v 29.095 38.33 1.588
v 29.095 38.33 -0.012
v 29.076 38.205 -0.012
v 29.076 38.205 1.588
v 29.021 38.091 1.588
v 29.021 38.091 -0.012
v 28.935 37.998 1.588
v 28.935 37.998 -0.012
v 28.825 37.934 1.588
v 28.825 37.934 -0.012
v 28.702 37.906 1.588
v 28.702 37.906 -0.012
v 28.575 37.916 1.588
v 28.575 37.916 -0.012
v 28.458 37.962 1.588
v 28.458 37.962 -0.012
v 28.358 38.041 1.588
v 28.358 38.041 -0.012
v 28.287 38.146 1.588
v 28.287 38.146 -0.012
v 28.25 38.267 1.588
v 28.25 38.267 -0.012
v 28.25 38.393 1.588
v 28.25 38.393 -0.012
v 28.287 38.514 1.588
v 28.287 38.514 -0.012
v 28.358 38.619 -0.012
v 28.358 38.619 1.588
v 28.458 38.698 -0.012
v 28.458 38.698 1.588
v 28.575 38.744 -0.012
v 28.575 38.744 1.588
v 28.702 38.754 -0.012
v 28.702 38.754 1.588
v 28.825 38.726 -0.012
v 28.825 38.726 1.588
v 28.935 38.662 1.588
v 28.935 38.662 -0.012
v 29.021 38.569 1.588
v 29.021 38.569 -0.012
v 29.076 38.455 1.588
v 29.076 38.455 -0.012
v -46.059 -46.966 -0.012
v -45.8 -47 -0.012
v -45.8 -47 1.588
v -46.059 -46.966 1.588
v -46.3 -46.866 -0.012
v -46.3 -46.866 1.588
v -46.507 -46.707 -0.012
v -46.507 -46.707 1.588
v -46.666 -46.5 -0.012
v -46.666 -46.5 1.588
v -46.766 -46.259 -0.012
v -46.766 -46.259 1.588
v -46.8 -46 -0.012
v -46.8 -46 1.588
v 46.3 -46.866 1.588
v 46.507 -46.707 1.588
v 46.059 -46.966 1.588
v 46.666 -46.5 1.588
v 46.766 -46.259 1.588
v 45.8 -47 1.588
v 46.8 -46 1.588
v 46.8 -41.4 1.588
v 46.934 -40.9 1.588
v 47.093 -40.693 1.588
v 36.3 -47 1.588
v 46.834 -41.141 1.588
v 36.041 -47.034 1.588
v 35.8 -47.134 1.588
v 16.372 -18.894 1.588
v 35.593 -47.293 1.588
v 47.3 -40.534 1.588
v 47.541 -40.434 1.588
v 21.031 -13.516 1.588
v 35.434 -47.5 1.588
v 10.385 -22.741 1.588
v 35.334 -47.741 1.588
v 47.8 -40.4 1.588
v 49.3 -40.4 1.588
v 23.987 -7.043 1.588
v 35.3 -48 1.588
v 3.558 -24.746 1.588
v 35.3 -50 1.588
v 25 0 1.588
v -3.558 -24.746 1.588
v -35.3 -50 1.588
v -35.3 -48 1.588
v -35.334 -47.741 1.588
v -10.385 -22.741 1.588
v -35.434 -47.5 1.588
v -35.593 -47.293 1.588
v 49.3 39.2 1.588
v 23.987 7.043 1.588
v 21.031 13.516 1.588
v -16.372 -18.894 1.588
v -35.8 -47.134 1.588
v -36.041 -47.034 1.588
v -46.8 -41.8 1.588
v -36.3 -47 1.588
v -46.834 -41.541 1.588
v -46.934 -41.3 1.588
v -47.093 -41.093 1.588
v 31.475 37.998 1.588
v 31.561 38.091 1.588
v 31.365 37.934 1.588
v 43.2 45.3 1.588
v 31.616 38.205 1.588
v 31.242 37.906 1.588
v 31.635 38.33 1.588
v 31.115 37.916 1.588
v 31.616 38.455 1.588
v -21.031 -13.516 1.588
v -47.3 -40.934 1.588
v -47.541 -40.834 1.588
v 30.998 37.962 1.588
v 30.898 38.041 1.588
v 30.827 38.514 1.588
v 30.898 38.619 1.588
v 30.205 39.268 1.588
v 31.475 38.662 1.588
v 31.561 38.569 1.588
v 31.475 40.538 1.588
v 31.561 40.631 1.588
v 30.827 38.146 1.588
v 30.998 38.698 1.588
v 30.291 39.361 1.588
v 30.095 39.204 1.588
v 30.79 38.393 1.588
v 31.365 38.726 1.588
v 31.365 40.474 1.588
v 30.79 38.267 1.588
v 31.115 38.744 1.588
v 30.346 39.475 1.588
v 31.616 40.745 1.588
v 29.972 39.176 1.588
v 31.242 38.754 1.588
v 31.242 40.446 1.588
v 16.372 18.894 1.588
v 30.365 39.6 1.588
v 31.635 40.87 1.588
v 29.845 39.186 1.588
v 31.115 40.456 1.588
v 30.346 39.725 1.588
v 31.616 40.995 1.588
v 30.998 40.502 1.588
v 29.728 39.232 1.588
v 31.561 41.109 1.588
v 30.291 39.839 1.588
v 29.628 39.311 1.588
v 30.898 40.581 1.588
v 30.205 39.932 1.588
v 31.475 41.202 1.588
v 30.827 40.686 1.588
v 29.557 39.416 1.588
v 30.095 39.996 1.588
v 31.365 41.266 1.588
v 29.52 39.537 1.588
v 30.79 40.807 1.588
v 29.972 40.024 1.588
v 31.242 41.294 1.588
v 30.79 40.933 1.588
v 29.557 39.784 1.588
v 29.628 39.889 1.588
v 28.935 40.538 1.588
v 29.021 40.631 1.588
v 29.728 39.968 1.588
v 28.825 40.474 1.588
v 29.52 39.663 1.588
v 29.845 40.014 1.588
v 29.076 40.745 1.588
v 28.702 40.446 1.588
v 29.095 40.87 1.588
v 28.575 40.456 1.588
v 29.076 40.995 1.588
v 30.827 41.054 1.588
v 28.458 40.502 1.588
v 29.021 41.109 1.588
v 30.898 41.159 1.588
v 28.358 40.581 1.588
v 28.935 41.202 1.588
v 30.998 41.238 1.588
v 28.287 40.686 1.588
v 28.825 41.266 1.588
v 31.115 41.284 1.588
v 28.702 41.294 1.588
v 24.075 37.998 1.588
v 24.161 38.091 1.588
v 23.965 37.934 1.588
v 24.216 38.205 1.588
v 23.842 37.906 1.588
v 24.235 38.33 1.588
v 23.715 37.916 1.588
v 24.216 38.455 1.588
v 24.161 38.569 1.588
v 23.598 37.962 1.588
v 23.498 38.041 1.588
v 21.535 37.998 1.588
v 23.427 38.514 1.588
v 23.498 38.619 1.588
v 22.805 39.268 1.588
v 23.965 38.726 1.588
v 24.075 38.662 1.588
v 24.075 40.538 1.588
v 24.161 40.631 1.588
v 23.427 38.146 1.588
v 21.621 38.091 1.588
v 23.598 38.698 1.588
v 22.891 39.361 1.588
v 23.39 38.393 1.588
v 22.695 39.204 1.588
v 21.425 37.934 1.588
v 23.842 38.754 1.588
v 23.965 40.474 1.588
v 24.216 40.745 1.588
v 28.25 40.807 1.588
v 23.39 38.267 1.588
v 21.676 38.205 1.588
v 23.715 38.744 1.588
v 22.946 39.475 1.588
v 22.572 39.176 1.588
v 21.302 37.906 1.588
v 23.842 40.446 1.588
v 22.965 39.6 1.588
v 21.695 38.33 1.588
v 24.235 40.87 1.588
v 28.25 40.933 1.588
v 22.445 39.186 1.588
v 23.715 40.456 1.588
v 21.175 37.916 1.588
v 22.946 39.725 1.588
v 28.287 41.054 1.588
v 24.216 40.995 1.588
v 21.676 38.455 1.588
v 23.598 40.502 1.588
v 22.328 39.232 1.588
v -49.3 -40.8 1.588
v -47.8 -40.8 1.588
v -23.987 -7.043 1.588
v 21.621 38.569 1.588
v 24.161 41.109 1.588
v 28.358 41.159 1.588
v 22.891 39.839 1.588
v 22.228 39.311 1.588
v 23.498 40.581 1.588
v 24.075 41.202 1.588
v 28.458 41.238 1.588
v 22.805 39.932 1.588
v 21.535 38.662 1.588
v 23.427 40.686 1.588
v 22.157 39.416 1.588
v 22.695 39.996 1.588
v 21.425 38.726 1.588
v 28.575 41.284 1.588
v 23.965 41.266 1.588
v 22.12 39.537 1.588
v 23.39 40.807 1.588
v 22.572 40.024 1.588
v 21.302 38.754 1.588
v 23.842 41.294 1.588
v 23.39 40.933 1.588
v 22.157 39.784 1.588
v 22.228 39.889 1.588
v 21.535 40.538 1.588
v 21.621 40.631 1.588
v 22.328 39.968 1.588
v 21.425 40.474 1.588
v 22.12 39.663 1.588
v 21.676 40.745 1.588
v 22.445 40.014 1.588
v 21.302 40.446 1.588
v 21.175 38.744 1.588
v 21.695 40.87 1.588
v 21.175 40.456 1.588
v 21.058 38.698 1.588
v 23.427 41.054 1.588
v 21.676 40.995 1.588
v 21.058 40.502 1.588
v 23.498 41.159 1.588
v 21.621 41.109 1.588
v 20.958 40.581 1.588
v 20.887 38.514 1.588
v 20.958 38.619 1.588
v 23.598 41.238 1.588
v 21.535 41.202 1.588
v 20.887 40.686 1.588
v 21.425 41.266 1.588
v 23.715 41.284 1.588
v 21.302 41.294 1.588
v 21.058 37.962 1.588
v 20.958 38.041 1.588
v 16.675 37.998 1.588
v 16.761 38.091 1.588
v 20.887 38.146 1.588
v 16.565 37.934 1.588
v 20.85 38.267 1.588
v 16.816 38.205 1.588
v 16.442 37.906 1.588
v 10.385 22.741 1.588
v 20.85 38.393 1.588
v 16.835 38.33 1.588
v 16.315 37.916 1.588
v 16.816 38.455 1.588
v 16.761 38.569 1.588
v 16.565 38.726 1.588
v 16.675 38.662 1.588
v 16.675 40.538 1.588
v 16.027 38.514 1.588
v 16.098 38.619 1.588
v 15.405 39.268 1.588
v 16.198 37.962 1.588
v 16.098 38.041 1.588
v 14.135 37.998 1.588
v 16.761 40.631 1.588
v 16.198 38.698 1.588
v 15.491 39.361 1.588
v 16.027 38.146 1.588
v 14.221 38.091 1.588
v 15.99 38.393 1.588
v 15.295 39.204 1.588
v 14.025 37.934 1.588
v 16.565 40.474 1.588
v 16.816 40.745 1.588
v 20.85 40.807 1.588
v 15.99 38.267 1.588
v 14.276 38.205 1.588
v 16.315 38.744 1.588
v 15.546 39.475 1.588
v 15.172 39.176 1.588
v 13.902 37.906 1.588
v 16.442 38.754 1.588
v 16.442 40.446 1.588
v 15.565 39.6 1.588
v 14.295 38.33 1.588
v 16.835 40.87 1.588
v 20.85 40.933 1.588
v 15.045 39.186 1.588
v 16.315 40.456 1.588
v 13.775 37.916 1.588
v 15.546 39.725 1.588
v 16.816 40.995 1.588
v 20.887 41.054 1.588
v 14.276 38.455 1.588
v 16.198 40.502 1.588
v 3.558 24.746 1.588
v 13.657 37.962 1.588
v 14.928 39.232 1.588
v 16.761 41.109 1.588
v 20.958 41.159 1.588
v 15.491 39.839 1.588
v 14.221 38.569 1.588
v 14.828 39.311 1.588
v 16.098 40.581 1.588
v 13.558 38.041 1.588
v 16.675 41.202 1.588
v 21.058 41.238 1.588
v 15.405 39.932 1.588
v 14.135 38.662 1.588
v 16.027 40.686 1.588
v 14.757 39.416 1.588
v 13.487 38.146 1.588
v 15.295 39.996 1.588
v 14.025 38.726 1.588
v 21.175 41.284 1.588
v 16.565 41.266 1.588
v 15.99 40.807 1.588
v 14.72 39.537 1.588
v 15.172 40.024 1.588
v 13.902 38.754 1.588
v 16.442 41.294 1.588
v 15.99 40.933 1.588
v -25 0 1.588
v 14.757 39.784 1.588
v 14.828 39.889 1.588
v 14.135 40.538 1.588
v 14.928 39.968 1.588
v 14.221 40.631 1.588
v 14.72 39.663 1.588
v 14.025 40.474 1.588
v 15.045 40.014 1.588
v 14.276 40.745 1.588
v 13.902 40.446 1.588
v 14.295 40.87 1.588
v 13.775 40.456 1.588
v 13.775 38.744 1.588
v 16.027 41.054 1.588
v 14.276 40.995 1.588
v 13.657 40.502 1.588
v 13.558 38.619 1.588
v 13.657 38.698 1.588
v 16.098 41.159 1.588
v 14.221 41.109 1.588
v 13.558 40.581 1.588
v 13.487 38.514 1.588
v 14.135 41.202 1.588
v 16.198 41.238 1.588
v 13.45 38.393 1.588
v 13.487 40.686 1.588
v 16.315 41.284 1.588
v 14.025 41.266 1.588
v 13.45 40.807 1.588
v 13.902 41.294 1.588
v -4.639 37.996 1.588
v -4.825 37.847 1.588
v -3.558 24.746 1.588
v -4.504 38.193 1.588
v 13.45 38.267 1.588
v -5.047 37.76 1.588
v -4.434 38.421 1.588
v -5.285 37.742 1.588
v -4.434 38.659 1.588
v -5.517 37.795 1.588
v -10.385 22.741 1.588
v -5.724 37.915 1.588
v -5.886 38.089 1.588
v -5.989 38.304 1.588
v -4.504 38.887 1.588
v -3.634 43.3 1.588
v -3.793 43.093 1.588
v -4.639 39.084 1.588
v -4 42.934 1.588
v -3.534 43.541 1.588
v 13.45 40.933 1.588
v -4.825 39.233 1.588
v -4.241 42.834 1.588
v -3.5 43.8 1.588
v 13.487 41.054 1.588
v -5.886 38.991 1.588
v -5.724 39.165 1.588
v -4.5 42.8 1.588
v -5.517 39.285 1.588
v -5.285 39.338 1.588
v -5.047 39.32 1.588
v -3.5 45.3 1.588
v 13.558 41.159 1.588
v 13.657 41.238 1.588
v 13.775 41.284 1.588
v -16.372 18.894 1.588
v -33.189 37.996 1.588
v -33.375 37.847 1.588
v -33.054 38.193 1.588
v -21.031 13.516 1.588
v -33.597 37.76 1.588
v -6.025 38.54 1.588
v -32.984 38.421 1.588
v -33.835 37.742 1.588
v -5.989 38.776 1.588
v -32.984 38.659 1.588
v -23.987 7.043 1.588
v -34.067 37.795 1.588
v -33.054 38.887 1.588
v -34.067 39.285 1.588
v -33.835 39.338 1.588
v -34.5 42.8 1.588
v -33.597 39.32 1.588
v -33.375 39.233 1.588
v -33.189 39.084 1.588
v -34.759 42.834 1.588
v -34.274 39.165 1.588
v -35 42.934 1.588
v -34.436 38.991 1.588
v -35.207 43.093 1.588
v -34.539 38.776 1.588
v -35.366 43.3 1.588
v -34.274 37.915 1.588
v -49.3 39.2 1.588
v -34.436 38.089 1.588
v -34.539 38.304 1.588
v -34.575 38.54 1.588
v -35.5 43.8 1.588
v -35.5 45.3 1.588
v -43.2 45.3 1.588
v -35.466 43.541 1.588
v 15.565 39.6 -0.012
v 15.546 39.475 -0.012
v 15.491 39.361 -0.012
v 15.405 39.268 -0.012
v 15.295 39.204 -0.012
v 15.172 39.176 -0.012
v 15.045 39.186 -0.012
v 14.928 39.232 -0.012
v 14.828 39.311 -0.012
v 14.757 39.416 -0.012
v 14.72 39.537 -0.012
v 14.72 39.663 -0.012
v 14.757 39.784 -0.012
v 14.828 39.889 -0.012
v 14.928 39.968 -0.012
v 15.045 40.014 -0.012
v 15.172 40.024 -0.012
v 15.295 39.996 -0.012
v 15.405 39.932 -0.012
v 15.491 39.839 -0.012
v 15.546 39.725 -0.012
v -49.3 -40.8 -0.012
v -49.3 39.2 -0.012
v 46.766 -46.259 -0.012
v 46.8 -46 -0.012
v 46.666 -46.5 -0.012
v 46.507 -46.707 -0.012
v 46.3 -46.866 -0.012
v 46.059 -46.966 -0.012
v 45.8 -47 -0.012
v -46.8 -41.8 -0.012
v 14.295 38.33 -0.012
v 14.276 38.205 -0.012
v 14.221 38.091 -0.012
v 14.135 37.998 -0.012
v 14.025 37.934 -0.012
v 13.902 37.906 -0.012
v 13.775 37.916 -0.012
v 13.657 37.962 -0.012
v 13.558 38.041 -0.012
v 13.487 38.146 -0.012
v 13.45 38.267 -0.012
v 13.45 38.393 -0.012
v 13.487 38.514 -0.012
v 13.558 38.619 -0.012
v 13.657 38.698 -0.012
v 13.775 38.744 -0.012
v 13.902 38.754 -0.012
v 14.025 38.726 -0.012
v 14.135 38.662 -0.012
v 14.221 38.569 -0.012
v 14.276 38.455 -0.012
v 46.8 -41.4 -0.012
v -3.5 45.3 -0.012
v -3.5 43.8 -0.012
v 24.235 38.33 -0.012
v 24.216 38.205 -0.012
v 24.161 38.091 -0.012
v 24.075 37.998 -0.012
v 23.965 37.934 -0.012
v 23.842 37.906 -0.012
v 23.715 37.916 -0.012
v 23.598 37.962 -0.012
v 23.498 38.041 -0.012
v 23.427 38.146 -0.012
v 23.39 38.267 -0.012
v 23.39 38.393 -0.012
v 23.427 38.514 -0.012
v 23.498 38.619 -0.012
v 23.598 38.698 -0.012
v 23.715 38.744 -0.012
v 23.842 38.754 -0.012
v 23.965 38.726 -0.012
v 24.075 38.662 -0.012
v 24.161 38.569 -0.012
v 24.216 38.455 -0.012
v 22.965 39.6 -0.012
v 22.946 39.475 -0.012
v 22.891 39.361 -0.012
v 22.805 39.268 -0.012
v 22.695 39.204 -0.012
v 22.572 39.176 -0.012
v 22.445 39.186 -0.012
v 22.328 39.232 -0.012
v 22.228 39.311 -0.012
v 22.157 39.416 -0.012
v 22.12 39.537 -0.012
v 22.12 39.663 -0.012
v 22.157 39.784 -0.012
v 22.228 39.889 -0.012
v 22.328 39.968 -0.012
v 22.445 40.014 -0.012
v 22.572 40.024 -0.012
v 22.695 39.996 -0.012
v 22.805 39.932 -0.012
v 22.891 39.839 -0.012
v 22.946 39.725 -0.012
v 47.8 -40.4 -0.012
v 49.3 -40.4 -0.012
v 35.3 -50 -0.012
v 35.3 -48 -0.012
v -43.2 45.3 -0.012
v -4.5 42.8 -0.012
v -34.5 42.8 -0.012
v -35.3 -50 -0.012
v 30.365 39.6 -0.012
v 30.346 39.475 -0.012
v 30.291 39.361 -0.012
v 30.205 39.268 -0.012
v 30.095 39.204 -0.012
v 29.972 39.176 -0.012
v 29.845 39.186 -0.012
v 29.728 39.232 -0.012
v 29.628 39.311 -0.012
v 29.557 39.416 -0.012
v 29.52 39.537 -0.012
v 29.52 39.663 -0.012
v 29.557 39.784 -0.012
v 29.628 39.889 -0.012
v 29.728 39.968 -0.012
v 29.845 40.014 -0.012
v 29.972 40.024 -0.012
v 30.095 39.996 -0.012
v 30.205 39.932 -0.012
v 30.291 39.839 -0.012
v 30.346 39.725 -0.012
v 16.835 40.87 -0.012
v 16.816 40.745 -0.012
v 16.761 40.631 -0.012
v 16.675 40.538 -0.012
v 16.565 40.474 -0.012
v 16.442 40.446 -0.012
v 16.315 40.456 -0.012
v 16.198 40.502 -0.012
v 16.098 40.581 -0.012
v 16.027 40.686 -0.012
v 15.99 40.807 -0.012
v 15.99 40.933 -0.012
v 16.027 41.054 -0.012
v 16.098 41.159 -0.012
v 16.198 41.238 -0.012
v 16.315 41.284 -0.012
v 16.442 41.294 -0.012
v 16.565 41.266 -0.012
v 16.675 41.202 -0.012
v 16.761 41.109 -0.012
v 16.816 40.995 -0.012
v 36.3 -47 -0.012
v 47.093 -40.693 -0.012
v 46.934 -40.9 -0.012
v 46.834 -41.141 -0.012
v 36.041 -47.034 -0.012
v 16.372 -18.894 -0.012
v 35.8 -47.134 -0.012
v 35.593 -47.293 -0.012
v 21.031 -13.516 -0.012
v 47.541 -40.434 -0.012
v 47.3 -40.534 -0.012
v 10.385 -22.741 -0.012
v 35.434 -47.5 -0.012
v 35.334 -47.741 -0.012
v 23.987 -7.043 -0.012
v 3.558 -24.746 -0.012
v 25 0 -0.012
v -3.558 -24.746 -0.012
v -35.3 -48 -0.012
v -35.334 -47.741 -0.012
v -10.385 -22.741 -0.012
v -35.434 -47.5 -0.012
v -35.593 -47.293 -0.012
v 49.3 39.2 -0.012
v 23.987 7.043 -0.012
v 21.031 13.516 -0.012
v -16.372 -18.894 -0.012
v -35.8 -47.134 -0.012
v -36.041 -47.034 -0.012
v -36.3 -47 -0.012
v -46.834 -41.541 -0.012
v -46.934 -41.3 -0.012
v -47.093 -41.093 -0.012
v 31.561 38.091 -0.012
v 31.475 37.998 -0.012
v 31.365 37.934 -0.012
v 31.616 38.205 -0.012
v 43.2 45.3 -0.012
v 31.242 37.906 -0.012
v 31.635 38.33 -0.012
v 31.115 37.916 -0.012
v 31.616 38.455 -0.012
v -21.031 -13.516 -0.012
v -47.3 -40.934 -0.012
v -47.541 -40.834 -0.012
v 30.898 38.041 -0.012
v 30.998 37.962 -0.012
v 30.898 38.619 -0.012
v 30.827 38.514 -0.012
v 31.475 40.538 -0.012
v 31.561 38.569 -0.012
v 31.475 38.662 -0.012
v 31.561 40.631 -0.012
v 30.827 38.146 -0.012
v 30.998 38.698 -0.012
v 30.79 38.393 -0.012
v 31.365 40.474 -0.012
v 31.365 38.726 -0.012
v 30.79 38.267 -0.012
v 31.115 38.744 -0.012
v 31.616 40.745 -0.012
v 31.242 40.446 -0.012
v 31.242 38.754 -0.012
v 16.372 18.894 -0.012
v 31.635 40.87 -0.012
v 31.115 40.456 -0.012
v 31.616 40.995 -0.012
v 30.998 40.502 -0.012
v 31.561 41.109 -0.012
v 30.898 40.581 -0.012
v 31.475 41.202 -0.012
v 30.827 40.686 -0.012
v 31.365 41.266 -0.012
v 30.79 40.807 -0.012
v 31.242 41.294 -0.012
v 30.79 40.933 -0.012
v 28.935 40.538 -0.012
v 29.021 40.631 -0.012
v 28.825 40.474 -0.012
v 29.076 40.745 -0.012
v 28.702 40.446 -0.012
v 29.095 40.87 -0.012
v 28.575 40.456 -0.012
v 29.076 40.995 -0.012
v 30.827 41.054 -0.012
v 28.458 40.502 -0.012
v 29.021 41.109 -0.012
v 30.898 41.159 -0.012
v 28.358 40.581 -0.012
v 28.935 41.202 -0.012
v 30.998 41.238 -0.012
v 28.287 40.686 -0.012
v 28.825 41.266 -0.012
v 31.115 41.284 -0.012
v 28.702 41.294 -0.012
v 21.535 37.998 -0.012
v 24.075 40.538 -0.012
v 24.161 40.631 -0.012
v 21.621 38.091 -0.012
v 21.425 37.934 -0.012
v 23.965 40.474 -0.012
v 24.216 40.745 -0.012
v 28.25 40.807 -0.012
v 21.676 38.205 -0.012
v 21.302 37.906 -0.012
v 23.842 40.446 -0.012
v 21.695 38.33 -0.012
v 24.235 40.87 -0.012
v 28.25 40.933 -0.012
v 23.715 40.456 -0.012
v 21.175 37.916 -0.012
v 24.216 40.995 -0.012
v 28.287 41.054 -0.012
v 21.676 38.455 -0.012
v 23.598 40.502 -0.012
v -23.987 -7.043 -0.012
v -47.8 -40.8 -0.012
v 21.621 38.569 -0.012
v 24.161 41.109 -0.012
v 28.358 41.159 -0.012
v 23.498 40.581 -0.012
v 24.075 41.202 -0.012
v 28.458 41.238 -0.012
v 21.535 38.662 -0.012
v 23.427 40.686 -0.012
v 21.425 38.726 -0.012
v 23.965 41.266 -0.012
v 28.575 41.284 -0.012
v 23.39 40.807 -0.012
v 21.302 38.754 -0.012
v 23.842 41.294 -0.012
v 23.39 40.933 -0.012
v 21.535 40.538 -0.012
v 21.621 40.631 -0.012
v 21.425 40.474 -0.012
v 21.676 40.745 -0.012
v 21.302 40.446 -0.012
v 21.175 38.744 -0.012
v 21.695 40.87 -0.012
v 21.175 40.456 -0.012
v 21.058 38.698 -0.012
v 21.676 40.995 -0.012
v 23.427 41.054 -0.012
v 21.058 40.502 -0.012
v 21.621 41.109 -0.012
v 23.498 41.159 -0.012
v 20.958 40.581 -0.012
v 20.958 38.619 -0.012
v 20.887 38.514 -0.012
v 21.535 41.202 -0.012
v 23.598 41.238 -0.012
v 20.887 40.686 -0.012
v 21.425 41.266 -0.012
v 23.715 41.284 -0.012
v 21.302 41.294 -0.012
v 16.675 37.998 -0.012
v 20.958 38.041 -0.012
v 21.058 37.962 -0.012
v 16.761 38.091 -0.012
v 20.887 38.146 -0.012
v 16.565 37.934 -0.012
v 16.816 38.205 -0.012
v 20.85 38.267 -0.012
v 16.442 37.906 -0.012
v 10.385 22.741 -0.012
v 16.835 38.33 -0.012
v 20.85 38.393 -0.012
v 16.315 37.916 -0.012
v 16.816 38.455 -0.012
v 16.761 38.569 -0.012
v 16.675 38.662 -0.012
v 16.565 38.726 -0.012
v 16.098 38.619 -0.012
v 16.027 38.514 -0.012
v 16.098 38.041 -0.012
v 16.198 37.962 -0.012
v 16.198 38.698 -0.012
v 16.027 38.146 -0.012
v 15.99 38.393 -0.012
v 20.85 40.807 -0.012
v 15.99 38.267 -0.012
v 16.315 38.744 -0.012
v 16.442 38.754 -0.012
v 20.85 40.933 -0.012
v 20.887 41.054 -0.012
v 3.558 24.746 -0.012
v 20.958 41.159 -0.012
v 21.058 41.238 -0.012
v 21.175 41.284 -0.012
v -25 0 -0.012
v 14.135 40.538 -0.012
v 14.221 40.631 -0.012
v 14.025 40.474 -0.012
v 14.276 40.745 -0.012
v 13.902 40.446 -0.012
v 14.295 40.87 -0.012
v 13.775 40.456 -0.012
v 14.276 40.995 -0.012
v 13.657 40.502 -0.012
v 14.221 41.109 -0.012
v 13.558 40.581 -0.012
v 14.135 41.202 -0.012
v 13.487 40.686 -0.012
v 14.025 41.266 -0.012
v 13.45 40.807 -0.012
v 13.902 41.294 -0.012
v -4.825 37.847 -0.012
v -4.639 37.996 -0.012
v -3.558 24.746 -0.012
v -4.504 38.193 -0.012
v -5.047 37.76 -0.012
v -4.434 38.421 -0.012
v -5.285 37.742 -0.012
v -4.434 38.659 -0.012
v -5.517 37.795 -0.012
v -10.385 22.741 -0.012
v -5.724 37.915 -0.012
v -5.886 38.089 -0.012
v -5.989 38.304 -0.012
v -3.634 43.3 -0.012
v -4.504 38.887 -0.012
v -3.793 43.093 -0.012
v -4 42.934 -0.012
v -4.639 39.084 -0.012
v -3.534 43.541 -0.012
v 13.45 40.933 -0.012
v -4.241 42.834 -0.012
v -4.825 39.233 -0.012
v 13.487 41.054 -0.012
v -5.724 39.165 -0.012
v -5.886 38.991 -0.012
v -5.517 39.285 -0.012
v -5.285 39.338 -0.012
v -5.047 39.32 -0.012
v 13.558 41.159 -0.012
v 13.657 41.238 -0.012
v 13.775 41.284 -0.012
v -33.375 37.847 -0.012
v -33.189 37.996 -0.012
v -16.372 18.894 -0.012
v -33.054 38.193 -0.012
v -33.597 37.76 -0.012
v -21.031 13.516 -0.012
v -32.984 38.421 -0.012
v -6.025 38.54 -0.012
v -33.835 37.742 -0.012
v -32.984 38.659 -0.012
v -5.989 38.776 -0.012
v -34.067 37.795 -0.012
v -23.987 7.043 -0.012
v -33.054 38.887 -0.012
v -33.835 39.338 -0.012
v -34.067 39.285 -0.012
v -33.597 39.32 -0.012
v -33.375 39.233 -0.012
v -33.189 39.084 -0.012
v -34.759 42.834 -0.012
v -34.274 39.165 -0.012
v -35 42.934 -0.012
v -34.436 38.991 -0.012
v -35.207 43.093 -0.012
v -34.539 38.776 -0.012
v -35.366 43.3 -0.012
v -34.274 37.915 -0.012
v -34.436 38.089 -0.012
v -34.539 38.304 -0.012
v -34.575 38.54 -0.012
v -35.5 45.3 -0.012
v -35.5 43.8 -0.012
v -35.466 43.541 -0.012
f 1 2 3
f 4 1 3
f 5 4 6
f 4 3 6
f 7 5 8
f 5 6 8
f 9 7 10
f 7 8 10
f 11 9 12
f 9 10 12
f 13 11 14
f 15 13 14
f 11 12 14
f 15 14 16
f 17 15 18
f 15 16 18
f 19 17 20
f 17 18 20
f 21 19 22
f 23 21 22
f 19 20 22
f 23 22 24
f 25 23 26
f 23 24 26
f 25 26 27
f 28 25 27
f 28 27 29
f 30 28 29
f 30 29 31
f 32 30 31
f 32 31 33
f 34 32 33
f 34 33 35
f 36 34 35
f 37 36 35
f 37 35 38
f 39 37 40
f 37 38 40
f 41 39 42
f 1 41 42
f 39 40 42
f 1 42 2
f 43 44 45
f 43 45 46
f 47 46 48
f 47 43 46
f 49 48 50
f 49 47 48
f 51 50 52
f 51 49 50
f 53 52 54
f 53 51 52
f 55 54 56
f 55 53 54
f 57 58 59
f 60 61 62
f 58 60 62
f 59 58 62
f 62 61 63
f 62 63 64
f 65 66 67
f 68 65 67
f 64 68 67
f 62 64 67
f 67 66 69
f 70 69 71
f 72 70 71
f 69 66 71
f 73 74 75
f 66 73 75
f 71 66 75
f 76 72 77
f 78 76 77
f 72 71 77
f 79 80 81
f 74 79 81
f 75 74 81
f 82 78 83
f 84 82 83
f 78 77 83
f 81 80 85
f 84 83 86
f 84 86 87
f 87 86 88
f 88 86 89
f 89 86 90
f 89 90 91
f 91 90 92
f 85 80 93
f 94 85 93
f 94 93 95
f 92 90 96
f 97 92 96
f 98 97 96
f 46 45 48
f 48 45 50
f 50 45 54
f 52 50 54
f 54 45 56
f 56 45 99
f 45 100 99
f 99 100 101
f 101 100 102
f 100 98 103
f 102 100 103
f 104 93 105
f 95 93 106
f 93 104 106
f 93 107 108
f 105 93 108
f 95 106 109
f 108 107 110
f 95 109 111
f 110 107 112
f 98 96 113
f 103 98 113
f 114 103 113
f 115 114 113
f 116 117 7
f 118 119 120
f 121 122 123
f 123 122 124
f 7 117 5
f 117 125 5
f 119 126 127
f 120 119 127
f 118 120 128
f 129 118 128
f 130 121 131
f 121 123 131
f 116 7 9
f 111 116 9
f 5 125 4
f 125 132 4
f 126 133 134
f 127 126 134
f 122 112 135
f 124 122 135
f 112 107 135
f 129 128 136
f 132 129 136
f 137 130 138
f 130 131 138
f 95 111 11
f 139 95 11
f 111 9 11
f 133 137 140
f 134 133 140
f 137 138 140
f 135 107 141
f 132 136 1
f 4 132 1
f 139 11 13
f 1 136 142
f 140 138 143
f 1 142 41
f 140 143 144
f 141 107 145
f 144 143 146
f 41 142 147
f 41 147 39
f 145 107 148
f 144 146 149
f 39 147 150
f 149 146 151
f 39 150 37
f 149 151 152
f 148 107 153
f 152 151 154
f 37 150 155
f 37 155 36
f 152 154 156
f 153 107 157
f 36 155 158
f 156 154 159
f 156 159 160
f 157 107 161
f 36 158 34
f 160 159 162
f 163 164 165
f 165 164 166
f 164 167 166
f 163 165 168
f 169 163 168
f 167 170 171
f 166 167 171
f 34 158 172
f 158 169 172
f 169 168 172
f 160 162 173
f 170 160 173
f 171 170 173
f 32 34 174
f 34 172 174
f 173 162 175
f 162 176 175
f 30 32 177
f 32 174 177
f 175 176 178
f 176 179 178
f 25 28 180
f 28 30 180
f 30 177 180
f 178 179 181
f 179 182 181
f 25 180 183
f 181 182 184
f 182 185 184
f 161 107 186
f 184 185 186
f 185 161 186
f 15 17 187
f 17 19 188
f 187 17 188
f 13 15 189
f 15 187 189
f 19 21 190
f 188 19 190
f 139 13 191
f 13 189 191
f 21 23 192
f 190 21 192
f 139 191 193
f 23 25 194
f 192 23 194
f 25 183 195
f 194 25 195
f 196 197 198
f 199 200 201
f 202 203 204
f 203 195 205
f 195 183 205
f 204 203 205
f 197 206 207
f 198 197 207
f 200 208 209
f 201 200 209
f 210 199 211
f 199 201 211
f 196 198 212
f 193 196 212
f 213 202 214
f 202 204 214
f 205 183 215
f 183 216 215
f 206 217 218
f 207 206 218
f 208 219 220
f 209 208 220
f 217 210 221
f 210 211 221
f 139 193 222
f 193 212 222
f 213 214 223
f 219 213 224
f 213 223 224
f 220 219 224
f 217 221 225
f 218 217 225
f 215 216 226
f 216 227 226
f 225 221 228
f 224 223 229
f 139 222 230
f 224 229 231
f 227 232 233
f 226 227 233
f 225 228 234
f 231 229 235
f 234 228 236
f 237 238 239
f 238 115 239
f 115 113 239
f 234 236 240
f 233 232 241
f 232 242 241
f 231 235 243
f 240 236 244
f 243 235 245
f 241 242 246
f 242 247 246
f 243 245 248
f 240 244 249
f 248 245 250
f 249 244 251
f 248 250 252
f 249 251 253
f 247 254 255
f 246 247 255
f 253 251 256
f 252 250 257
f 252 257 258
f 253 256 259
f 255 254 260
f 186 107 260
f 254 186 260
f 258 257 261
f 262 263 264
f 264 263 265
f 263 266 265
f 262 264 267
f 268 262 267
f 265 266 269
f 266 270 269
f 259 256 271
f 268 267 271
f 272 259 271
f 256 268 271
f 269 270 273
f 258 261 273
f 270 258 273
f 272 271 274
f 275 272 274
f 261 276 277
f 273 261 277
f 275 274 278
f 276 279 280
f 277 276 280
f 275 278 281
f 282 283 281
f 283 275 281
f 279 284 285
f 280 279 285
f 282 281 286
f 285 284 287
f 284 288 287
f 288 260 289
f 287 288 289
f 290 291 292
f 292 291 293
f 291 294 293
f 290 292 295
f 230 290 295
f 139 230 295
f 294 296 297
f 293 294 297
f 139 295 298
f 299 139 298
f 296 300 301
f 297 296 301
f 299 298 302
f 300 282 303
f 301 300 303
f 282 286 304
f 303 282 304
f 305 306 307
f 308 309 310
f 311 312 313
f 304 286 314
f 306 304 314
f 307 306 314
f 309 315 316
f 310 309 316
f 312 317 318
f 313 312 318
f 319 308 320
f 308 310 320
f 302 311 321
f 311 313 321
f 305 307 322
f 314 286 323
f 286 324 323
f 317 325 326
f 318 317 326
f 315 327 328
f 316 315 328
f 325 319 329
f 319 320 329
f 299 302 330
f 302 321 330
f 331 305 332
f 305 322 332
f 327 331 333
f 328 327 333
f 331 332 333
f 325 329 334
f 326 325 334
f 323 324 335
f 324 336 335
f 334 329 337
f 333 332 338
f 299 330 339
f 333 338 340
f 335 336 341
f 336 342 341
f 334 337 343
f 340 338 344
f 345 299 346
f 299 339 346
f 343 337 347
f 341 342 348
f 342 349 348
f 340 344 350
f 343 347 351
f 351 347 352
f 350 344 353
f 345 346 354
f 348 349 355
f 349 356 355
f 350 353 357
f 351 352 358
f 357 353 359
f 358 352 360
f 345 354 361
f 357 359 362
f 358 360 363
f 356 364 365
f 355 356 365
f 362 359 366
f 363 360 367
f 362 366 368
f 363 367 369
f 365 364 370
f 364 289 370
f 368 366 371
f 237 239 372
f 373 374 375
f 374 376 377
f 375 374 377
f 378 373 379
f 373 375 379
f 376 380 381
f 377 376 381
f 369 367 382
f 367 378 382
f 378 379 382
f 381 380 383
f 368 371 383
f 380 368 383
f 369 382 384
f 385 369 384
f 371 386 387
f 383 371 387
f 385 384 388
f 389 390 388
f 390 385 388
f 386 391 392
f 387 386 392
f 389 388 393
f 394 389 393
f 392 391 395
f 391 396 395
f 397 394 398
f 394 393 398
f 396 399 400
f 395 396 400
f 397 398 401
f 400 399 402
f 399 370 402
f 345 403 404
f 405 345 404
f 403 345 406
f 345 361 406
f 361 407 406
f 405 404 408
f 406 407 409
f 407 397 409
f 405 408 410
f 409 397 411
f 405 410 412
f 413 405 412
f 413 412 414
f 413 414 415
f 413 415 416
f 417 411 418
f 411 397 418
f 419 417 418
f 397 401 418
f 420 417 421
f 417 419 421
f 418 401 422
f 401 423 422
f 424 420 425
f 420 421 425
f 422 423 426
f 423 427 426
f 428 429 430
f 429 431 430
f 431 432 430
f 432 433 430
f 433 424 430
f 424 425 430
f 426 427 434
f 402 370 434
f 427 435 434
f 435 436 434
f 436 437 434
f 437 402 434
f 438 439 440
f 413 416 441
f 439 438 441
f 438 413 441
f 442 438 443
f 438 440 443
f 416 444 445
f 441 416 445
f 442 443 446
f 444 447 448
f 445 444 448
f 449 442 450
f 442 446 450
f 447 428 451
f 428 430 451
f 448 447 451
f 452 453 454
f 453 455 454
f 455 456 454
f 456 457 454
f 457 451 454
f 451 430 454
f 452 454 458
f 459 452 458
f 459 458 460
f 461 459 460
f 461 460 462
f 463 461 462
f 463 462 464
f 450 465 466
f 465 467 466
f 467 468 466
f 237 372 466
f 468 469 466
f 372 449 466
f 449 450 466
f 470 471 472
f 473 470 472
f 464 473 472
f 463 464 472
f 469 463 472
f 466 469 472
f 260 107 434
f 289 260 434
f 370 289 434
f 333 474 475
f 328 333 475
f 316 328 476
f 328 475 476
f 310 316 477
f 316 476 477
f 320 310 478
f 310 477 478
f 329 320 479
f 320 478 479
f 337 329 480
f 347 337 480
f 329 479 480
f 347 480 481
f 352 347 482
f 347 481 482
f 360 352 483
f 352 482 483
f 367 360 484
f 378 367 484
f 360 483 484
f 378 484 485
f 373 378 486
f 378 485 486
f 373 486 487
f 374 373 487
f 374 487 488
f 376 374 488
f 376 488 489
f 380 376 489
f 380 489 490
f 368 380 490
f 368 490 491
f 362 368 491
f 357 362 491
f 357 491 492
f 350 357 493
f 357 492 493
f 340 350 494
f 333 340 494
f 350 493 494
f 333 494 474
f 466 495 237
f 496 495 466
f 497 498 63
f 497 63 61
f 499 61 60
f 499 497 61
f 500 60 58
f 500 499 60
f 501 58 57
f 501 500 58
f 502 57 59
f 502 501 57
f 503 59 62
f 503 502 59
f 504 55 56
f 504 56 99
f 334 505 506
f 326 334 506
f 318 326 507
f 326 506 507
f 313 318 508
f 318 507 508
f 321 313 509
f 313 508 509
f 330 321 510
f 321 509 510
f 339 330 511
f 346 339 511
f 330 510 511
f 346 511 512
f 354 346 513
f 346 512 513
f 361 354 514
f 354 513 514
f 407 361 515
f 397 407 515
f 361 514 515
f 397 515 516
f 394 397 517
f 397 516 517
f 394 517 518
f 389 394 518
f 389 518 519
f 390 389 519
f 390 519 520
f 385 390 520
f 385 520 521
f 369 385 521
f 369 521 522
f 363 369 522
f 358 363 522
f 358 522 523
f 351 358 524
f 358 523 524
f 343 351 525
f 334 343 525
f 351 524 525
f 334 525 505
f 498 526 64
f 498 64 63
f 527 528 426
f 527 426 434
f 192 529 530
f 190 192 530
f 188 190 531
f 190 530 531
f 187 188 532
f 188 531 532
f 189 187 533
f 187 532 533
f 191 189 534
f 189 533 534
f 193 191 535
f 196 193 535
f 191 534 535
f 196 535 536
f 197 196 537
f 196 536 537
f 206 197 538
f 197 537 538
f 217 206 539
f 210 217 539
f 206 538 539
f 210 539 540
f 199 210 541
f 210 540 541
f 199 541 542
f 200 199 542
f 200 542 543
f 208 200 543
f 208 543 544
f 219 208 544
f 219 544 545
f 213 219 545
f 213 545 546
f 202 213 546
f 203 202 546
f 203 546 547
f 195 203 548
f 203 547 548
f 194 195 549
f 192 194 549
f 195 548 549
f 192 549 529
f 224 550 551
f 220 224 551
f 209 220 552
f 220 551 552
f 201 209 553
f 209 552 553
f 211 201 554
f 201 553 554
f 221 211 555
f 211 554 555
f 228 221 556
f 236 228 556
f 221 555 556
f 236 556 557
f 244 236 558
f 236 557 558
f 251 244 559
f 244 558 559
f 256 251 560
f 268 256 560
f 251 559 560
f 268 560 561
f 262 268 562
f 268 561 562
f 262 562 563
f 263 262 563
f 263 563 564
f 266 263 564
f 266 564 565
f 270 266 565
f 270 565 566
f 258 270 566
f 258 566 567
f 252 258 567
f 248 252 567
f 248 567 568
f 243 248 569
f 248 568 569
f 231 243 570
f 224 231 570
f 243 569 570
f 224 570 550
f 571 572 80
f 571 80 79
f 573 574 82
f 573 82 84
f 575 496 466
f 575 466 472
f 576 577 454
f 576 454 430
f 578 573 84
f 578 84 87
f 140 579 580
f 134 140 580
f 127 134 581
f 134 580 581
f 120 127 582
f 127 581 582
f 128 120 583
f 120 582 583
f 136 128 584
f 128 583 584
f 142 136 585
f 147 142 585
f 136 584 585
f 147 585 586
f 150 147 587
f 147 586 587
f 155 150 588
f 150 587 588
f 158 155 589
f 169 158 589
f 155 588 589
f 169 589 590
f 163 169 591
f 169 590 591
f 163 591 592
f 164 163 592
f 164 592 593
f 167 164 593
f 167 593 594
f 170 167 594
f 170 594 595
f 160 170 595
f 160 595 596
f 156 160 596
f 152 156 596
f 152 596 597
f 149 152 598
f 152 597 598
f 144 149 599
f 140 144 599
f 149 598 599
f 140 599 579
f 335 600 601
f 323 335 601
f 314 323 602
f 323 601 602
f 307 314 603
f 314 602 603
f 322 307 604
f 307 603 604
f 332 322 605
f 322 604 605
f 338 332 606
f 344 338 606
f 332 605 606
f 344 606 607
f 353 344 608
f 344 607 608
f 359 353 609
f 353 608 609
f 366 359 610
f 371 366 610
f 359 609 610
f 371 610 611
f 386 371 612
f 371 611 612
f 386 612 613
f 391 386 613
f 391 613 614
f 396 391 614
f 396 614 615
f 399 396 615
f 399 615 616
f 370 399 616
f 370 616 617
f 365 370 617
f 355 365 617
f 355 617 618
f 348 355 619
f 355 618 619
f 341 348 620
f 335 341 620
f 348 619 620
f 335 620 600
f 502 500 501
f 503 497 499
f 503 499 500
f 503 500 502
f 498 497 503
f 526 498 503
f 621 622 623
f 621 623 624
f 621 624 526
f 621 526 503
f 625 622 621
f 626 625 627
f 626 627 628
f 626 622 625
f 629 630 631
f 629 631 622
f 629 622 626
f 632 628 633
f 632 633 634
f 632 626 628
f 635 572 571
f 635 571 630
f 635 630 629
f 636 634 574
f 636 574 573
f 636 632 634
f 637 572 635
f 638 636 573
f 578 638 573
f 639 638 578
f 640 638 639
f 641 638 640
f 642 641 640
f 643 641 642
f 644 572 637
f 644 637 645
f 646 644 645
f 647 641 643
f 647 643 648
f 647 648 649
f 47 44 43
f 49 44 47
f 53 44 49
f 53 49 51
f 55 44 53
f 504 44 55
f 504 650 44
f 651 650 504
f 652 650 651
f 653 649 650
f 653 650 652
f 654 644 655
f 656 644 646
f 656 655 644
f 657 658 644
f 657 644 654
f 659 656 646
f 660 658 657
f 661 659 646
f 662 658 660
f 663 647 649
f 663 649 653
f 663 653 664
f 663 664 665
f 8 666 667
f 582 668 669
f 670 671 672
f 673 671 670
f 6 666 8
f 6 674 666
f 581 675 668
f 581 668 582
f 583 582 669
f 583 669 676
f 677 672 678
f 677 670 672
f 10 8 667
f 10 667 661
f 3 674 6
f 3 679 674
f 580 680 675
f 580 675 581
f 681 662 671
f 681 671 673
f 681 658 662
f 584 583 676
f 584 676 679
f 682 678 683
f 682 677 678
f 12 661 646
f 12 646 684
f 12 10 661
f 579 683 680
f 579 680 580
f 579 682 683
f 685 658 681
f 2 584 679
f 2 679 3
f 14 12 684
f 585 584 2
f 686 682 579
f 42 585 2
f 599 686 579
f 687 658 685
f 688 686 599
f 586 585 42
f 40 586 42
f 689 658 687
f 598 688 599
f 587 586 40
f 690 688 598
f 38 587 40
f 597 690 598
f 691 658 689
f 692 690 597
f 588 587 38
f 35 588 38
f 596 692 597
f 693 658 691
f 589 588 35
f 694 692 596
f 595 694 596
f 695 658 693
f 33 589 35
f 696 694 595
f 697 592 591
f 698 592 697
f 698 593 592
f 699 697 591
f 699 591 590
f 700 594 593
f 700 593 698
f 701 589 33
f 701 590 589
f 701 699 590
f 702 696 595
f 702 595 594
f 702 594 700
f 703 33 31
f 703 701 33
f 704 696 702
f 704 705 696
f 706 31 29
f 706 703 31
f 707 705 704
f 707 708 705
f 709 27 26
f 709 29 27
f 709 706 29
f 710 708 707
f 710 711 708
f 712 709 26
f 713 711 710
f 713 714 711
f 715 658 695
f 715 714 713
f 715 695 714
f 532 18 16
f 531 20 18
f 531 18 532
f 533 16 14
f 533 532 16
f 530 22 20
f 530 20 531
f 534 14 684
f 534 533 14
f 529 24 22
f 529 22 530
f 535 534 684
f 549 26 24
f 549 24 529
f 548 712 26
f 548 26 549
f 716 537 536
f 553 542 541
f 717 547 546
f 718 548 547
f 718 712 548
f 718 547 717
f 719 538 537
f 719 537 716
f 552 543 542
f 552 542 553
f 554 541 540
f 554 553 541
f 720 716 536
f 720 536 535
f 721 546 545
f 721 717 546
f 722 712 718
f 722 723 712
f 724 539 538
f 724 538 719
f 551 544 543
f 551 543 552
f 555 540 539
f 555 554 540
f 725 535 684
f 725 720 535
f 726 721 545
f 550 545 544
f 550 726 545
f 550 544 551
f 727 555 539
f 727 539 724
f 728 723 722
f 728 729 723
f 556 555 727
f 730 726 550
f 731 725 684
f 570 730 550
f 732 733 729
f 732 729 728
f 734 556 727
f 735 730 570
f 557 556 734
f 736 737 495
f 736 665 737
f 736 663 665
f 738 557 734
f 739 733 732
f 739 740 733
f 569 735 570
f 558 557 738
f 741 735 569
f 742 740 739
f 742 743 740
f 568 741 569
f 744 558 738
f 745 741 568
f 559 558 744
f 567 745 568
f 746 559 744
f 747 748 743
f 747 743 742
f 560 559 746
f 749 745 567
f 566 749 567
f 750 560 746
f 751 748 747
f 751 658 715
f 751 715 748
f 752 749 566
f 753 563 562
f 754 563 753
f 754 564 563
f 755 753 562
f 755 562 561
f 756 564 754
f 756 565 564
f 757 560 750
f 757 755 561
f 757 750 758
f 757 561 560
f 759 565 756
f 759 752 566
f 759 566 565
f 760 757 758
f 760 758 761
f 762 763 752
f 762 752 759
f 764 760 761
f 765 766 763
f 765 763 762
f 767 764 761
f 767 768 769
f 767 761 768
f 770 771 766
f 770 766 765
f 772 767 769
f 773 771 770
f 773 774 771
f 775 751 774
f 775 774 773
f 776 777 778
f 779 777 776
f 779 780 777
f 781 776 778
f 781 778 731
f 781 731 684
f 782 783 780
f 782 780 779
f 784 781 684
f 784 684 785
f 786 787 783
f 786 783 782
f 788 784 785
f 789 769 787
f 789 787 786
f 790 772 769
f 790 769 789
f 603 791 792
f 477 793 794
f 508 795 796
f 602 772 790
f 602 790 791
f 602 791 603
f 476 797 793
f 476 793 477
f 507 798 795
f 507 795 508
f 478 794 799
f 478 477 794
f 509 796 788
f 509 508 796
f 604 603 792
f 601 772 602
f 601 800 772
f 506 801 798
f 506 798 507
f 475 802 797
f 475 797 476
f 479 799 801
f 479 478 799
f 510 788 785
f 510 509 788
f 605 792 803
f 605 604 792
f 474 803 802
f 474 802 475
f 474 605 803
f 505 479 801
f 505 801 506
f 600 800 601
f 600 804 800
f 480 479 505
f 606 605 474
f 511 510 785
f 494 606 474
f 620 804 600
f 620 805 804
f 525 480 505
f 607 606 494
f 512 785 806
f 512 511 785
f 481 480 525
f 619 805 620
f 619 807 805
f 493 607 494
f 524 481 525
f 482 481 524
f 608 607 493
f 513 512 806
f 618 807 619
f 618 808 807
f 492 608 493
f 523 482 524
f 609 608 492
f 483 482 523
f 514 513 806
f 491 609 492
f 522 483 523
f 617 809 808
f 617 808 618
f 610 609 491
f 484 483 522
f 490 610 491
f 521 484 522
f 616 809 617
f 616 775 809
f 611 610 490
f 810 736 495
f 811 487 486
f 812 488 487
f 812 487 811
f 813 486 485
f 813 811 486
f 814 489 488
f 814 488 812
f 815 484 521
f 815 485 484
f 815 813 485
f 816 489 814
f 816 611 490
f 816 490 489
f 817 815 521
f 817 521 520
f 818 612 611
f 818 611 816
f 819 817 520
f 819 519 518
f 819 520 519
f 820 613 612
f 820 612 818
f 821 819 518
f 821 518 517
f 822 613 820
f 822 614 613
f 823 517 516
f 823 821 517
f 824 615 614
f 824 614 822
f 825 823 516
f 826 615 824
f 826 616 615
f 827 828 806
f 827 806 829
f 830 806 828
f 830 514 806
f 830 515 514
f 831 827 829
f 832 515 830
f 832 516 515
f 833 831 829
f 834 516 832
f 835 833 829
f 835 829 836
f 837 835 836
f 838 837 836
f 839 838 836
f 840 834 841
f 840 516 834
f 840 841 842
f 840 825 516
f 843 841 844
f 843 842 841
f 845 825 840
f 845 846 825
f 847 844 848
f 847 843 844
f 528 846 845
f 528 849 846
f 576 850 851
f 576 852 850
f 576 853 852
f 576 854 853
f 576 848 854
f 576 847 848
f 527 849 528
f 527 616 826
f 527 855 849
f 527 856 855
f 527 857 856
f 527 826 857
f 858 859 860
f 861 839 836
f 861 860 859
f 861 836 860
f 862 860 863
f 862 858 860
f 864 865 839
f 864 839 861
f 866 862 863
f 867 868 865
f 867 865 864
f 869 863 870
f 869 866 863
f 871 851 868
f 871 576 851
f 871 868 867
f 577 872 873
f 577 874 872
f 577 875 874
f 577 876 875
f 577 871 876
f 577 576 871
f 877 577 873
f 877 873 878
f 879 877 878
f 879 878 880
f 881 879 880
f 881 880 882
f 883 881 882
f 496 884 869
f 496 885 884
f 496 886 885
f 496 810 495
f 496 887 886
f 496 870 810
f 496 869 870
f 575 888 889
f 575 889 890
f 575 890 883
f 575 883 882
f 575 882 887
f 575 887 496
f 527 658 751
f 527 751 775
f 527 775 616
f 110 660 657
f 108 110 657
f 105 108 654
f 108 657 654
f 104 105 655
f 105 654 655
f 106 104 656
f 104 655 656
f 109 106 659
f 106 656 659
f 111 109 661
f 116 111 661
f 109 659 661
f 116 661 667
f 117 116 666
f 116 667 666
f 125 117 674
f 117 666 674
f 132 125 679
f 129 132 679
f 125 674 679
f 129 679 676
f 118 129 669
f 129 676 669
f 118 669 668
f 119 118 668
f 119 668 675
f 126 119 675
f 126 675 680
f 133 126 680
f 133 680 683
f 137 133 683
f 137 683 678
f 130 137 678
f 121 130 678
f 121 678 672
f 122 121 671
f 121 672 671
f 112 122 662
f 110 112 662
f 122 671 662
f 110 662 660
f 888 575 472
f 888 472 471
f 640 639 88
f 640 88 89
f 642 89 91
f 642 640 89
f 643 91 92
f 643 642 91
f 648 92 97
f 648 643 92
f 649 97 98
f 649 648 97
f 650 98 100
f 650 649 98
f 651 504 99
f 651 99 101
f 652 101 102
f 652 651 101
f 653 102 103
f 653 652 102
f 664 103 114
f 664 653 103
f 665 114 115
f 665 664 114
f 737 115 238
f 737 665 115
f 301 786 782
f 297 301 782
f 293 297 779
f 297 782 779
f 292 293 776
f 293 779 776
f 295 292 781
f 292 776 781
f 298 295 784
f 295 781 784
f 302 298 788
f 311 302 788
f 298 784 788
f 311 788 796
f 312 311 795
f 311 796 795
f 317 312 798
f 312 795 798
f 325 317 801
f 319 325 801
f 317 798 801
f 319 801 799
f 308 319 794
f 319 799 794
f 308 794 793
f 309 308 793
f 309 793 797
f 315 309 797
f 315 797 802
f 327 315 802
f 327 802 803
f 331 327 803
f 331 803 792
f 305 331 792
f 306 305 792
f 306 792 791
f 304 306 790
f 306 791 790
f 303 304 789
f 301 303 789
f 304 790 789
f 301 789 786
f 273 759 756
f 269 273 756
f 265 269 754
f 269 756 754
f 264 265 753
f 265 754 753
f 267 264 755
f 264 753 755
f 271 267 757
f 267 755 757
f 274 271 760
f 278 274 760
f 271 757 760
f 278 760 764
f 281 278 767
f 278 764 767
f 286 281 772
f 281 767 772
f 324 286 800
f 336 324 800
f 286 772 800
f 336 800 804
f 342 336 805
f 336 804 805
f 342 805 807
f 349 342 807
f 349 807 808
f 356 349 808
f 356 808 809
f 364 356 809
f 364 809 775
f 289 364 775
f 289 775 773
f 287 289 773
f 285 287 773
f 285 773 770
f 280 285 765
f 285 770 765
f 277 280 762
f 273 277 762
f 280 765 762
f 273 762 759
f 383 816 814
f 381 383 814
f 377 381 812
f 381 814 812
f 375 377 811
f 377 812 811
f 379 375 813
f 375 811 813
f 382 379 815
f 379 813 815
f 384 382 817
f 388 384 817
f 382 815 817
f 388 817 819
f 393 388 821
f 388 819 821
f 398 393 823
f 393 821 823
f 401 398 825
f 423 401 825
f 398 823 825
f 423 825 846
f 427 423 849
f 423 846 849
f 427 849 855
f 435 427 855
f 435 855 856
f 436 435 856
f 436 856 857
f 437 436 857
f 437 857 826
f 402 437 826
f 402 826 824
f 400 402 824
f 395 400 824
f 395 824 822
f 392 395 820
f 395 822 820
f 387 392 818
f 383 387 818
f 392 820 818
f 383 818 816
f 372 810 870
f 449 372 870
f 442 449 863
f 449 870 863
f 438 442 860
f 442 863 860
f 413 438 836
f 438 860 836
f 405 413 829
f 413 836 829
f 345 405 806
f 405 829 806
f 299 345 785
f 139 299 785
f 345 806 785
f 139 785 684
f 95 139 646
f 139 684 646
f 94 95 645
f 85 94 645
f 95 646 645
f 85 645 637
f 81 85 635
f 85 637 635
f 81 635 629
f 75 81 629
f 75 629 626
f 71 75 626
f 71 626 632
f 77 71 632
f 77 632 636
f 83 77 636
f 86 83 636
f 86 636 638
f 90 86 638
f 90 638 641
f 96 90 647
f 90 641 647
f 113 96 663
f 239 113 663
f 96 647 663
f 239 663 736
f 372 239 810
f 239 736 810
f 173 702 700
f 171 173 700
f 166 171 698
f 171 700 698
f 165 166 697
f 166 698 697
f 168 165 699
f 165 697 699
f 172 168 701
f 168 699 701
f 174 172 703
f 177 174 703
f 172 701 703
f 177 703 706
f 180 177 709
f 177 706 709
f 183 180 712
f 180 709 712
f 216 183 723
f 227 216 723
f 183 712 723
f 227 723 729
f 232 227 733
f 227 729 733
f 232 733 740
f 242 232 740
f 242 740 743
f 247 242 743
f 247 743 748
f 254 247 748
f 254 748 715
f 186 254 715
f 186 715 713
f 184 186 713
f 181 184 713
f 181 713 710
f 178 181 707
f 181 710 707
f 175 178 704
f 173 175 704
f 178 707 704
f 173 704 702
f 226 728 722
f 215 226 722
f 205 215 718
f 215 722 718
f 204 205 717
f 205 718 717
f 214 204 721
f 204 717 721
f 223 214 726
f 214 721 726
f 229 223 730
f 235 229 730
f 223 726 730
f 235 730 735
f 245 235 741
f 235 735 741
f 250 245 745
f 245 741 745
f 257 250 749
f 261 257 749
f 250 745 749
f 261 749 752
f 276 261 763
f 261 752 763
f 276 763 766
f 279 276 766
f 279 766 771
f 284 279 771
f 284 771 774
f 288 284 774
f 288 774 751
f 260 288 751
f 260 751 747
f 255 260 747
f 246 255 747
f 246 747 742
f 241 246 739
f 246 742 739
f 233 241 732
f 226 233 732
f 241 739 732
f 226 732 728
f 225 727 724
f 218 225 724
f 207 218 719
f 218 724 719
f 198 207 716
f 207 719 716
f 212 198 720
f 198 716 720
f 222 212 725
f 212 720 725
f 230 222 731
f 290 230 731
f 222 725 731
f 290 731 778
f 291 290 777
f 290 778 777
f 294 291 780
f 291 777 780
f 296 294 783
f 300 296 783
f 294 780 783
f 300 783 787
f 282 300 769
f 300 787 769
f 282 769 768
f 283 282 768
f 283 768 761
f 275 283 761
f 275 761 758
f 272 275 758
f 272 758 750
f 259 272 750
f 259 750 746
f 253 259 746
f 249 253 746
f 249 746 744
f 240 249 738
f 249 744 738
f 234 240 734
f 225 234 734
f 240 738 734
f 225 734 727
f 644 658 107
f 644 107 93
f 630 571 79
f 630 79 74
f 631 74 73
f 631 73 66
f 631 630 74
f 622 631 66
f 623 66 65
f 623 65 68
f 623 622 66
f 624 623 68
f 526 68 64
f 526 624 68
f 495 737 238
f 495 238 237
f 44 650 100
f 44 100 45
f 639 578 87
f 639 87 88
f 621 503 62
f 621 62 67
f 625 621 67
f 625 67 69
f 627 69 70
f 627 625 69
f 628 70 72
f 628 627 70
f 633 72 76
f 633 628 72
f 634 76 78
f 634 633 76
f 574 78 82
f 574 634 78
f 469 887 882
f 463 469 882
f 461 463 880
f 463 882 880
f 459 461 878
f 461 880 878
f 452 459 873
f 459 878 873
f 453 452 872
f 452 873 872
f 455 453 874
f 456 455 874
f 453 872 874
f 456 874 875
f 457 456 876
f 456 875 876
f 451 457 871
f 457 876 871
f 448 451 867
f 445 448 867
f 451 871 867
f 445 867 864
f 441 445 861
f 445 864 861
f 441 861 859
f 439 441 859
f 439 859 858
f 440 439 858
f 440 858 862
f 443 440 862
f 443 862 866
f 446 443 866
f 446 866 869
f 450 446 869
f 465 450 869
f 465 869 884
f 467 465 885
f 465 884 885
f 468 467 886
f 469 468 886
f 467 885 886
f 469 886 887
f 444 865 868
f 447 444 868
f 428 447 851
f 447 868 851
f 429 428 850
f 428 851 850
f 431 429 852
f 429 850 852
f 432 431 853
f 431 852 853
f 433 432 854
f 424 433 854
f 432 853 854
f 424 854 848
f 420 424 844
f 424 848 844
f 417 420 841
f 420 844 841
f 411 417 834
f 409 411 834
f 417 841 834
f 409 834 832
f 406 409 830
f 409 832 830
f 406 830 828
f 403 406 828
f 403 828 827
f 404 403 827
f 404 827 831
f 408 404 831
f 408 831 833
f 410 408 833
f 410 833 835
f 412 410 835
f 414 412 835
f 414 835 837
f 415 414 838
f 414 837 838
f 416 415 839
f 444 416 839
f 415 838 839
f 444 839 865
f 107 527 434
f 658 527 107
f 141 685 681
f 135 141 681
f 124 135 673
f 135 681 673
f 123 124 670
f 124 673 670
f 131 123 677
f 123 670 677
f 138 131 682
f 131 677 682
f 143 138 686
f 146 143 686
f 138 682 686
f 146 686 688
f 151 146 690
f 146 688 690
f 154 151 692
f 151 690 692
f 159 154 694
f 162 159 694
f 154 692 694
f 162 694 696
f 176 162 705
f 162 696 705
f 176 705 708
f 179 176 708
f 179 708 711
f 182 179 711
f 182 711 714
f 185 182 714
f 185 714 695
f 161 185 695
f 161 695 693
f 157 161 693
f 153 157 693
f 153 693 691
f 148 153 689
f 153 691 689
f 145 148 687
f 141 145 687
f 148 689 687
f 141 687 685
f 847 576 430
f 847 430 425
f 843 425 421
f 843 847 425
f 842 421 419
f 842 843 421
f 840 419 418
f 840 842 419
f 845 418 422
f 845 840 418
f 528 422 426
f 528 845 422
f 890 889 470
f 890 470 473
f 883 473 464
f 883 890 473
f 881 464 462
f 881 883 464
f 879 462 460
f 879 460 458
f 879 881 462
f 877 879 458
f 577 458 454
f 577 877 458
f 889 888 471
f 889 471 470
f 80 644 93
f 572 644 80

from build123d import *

# Parameters (mm, degrees)
SKETCH1_R           = 0.425
SKETCH1_R_2         = 25
SKETCH1_R_3         = 0.8
BOSS_EXTRUDE1_DEPTH = 1.6


with BuildPart() as part:
    # Sketch1 → Boss-Extrude1 (new body)
    with BuildSketch(Plane(origin=(0, 0, -0.0125), x_dir=(-1, 0, 0), z_dir=(0, 0, -1))):
        with BuildLine():
            Line((47.8, -40.8), (49.3, -40.8))
            Line((49.3, -40.8), (49.3, 39.2))
            Line((49.3, 39.2), (43.2, 45.3))
            Line((43.2, 45.3), (35.500000017, 45.3))
            Line((35.500000017, 45.3), (35.500000017, 43.8))
            ThreePointArc((35.500000017, 43.8), (35.207106799, 43.092893219), (34.500000017, 42.8))
            Line((34.500000017, 42.8), (4.500000014, 42.8))
            ThreePointArc((4.500000014, 42.8), (3.792893232, 43.092893219), (3.500000014, 43.8))
            Line((3.500000014, 43.8), (3.500000014, 45.3))
            Line((3.500000014, 45.3), (-43.2, 45.3))
            Line((-43.2, 45.3), (-49.3, 39.2))
            Line((-49.3, 39.2), (-49.3, -40.4))
            Line((-49.3, -40.4), (-47.8, -40.4))
            ThreePointArc((-47.8, -40.4), (-47.092893219, -40.692893219), (-46.8, -41.4))
            Line((-46.8, -41.4), (-46.8, -46))
            ThreePointArc((-46.8, -46), (-46.507106781, -46.707106781), (-45.8, -47))
            Line((-45.8, -47), (-36.3, -47))
            ThreePointArc((-36.3, -47), (-35.592893219, -47.292893219), (-35.3, -48))
            Line((-35.3, -48), (-35.3, -50))
            Line((-35.3, -50), (35.3, -50))
            Line((35.3, -50), (35.3, -48))
            ThreePointArc((35.3, -48), (35.592893219, -47.292893219), (36.3, -47))
            Line((36.3, -47), (45.8, -47))
            ThreePointArc((45.8, -47), (46.507106781, -46.707106781), (46.8, -46))
            Line((46.8, -46), (46.8, -41.8))
            ThreePointArc((46.8, -41.8), (47.092893219, -41.092893219), (47.8, -40.8))
        make_face()
        with Locations(Location((-13.87, 38.33, 0), (0, 0, 180))):
            Circle(SKETCH1_R, mode=Mode.SUBTRACT)
        Circle(SKETCH1_R_2, mode=Mode.SUBTRACT)
        with Locations(Location((-22.54, 39.6, 0), (0, 0, 180))):
            Circle(SKETCH1_R, mode=Mode.SUBTRACT)
        with Locations(Location((-23.81, 40.87, 0), (0, 0, 180))):
            Circle(SKETCH1_R, mode=Mode.SUBTRACT)
        with Locations(Location((-21.27, 40.87, 0), (0, 0, 180))):
            Circle(SKETCH1_R, mode=Mode.SUBTRACT)
        with Locations(Location((-13.87, 40.87, 0), (0, 0, 180))):
            Circle(SKETCH1_R, mode=Mode.SUBTRACT)
        with Locations(Location((-31.21, 40.87, 0), (0, 0, 180))):
            Circle(SKETCH1_R, mode=Mode.SUBTRACT)
        with Locations(Location((-16.41, 40.87, 0), (0, 0, 180))):
            Circle(SKETCH1_R, mode=Mode.SUBTRACT)
        with Locations(Location((-15.14, 39.6, 0), (0, 0, 180))):
            Circle(SKETCH1_R, mode=Mode.SUBTRACT)
        with Locations(Location((-29.94, 39.6, 0), (0, 0, 180))):
            Circle(SKETCH1_R, mode=Mode.SUBTRACT)
        with Locations(Location((-28.67, 40.87, 0), (0, 0, 180))):
            Circle(SKETCH1_R, mode=Mode.SUBTRACT)
        with Locations(Location((-28.67, 38.33, 0), (0, 0, 180))):
            Circle(SKETCH1_R, mode=Mode.SUBTRACT)
        with Locations(Location((-16.41, 38.33, 0), (0, 0, 180))):
            Circle(SKETCH1_R, mode=Mode.SUBTRACT)
        with Locations(Location((-21.27, 38.33, 0), (0, 0, 180))):
            Circle(SKETCH1_R, mode=Mode.SUBTRACT)
        with Locations(Location((-23.81, 38.33, 0), (0, 0, 180))):
            Circle(SKETCH1_R, mode=Mode.SUBTRACT)
        with Locations(Location((-31.21, 38.33, 0), (0, 0, 180))):
            Circle(SKETCH1_R, mode=Mode.SUBTRACT)
        with Locations((33.775, 38.54)):
            Circle(SKETCH1_R_3, mode=Mode.SUBTRACT)
        with Locations((5.225, 38.54)):
            Circle(SKETCH1_R_3, mode=Mode.SUBTRACT)
    extrude(amount=-BOSS_EXTRUDE1_DEPTH)


solid = part.part
